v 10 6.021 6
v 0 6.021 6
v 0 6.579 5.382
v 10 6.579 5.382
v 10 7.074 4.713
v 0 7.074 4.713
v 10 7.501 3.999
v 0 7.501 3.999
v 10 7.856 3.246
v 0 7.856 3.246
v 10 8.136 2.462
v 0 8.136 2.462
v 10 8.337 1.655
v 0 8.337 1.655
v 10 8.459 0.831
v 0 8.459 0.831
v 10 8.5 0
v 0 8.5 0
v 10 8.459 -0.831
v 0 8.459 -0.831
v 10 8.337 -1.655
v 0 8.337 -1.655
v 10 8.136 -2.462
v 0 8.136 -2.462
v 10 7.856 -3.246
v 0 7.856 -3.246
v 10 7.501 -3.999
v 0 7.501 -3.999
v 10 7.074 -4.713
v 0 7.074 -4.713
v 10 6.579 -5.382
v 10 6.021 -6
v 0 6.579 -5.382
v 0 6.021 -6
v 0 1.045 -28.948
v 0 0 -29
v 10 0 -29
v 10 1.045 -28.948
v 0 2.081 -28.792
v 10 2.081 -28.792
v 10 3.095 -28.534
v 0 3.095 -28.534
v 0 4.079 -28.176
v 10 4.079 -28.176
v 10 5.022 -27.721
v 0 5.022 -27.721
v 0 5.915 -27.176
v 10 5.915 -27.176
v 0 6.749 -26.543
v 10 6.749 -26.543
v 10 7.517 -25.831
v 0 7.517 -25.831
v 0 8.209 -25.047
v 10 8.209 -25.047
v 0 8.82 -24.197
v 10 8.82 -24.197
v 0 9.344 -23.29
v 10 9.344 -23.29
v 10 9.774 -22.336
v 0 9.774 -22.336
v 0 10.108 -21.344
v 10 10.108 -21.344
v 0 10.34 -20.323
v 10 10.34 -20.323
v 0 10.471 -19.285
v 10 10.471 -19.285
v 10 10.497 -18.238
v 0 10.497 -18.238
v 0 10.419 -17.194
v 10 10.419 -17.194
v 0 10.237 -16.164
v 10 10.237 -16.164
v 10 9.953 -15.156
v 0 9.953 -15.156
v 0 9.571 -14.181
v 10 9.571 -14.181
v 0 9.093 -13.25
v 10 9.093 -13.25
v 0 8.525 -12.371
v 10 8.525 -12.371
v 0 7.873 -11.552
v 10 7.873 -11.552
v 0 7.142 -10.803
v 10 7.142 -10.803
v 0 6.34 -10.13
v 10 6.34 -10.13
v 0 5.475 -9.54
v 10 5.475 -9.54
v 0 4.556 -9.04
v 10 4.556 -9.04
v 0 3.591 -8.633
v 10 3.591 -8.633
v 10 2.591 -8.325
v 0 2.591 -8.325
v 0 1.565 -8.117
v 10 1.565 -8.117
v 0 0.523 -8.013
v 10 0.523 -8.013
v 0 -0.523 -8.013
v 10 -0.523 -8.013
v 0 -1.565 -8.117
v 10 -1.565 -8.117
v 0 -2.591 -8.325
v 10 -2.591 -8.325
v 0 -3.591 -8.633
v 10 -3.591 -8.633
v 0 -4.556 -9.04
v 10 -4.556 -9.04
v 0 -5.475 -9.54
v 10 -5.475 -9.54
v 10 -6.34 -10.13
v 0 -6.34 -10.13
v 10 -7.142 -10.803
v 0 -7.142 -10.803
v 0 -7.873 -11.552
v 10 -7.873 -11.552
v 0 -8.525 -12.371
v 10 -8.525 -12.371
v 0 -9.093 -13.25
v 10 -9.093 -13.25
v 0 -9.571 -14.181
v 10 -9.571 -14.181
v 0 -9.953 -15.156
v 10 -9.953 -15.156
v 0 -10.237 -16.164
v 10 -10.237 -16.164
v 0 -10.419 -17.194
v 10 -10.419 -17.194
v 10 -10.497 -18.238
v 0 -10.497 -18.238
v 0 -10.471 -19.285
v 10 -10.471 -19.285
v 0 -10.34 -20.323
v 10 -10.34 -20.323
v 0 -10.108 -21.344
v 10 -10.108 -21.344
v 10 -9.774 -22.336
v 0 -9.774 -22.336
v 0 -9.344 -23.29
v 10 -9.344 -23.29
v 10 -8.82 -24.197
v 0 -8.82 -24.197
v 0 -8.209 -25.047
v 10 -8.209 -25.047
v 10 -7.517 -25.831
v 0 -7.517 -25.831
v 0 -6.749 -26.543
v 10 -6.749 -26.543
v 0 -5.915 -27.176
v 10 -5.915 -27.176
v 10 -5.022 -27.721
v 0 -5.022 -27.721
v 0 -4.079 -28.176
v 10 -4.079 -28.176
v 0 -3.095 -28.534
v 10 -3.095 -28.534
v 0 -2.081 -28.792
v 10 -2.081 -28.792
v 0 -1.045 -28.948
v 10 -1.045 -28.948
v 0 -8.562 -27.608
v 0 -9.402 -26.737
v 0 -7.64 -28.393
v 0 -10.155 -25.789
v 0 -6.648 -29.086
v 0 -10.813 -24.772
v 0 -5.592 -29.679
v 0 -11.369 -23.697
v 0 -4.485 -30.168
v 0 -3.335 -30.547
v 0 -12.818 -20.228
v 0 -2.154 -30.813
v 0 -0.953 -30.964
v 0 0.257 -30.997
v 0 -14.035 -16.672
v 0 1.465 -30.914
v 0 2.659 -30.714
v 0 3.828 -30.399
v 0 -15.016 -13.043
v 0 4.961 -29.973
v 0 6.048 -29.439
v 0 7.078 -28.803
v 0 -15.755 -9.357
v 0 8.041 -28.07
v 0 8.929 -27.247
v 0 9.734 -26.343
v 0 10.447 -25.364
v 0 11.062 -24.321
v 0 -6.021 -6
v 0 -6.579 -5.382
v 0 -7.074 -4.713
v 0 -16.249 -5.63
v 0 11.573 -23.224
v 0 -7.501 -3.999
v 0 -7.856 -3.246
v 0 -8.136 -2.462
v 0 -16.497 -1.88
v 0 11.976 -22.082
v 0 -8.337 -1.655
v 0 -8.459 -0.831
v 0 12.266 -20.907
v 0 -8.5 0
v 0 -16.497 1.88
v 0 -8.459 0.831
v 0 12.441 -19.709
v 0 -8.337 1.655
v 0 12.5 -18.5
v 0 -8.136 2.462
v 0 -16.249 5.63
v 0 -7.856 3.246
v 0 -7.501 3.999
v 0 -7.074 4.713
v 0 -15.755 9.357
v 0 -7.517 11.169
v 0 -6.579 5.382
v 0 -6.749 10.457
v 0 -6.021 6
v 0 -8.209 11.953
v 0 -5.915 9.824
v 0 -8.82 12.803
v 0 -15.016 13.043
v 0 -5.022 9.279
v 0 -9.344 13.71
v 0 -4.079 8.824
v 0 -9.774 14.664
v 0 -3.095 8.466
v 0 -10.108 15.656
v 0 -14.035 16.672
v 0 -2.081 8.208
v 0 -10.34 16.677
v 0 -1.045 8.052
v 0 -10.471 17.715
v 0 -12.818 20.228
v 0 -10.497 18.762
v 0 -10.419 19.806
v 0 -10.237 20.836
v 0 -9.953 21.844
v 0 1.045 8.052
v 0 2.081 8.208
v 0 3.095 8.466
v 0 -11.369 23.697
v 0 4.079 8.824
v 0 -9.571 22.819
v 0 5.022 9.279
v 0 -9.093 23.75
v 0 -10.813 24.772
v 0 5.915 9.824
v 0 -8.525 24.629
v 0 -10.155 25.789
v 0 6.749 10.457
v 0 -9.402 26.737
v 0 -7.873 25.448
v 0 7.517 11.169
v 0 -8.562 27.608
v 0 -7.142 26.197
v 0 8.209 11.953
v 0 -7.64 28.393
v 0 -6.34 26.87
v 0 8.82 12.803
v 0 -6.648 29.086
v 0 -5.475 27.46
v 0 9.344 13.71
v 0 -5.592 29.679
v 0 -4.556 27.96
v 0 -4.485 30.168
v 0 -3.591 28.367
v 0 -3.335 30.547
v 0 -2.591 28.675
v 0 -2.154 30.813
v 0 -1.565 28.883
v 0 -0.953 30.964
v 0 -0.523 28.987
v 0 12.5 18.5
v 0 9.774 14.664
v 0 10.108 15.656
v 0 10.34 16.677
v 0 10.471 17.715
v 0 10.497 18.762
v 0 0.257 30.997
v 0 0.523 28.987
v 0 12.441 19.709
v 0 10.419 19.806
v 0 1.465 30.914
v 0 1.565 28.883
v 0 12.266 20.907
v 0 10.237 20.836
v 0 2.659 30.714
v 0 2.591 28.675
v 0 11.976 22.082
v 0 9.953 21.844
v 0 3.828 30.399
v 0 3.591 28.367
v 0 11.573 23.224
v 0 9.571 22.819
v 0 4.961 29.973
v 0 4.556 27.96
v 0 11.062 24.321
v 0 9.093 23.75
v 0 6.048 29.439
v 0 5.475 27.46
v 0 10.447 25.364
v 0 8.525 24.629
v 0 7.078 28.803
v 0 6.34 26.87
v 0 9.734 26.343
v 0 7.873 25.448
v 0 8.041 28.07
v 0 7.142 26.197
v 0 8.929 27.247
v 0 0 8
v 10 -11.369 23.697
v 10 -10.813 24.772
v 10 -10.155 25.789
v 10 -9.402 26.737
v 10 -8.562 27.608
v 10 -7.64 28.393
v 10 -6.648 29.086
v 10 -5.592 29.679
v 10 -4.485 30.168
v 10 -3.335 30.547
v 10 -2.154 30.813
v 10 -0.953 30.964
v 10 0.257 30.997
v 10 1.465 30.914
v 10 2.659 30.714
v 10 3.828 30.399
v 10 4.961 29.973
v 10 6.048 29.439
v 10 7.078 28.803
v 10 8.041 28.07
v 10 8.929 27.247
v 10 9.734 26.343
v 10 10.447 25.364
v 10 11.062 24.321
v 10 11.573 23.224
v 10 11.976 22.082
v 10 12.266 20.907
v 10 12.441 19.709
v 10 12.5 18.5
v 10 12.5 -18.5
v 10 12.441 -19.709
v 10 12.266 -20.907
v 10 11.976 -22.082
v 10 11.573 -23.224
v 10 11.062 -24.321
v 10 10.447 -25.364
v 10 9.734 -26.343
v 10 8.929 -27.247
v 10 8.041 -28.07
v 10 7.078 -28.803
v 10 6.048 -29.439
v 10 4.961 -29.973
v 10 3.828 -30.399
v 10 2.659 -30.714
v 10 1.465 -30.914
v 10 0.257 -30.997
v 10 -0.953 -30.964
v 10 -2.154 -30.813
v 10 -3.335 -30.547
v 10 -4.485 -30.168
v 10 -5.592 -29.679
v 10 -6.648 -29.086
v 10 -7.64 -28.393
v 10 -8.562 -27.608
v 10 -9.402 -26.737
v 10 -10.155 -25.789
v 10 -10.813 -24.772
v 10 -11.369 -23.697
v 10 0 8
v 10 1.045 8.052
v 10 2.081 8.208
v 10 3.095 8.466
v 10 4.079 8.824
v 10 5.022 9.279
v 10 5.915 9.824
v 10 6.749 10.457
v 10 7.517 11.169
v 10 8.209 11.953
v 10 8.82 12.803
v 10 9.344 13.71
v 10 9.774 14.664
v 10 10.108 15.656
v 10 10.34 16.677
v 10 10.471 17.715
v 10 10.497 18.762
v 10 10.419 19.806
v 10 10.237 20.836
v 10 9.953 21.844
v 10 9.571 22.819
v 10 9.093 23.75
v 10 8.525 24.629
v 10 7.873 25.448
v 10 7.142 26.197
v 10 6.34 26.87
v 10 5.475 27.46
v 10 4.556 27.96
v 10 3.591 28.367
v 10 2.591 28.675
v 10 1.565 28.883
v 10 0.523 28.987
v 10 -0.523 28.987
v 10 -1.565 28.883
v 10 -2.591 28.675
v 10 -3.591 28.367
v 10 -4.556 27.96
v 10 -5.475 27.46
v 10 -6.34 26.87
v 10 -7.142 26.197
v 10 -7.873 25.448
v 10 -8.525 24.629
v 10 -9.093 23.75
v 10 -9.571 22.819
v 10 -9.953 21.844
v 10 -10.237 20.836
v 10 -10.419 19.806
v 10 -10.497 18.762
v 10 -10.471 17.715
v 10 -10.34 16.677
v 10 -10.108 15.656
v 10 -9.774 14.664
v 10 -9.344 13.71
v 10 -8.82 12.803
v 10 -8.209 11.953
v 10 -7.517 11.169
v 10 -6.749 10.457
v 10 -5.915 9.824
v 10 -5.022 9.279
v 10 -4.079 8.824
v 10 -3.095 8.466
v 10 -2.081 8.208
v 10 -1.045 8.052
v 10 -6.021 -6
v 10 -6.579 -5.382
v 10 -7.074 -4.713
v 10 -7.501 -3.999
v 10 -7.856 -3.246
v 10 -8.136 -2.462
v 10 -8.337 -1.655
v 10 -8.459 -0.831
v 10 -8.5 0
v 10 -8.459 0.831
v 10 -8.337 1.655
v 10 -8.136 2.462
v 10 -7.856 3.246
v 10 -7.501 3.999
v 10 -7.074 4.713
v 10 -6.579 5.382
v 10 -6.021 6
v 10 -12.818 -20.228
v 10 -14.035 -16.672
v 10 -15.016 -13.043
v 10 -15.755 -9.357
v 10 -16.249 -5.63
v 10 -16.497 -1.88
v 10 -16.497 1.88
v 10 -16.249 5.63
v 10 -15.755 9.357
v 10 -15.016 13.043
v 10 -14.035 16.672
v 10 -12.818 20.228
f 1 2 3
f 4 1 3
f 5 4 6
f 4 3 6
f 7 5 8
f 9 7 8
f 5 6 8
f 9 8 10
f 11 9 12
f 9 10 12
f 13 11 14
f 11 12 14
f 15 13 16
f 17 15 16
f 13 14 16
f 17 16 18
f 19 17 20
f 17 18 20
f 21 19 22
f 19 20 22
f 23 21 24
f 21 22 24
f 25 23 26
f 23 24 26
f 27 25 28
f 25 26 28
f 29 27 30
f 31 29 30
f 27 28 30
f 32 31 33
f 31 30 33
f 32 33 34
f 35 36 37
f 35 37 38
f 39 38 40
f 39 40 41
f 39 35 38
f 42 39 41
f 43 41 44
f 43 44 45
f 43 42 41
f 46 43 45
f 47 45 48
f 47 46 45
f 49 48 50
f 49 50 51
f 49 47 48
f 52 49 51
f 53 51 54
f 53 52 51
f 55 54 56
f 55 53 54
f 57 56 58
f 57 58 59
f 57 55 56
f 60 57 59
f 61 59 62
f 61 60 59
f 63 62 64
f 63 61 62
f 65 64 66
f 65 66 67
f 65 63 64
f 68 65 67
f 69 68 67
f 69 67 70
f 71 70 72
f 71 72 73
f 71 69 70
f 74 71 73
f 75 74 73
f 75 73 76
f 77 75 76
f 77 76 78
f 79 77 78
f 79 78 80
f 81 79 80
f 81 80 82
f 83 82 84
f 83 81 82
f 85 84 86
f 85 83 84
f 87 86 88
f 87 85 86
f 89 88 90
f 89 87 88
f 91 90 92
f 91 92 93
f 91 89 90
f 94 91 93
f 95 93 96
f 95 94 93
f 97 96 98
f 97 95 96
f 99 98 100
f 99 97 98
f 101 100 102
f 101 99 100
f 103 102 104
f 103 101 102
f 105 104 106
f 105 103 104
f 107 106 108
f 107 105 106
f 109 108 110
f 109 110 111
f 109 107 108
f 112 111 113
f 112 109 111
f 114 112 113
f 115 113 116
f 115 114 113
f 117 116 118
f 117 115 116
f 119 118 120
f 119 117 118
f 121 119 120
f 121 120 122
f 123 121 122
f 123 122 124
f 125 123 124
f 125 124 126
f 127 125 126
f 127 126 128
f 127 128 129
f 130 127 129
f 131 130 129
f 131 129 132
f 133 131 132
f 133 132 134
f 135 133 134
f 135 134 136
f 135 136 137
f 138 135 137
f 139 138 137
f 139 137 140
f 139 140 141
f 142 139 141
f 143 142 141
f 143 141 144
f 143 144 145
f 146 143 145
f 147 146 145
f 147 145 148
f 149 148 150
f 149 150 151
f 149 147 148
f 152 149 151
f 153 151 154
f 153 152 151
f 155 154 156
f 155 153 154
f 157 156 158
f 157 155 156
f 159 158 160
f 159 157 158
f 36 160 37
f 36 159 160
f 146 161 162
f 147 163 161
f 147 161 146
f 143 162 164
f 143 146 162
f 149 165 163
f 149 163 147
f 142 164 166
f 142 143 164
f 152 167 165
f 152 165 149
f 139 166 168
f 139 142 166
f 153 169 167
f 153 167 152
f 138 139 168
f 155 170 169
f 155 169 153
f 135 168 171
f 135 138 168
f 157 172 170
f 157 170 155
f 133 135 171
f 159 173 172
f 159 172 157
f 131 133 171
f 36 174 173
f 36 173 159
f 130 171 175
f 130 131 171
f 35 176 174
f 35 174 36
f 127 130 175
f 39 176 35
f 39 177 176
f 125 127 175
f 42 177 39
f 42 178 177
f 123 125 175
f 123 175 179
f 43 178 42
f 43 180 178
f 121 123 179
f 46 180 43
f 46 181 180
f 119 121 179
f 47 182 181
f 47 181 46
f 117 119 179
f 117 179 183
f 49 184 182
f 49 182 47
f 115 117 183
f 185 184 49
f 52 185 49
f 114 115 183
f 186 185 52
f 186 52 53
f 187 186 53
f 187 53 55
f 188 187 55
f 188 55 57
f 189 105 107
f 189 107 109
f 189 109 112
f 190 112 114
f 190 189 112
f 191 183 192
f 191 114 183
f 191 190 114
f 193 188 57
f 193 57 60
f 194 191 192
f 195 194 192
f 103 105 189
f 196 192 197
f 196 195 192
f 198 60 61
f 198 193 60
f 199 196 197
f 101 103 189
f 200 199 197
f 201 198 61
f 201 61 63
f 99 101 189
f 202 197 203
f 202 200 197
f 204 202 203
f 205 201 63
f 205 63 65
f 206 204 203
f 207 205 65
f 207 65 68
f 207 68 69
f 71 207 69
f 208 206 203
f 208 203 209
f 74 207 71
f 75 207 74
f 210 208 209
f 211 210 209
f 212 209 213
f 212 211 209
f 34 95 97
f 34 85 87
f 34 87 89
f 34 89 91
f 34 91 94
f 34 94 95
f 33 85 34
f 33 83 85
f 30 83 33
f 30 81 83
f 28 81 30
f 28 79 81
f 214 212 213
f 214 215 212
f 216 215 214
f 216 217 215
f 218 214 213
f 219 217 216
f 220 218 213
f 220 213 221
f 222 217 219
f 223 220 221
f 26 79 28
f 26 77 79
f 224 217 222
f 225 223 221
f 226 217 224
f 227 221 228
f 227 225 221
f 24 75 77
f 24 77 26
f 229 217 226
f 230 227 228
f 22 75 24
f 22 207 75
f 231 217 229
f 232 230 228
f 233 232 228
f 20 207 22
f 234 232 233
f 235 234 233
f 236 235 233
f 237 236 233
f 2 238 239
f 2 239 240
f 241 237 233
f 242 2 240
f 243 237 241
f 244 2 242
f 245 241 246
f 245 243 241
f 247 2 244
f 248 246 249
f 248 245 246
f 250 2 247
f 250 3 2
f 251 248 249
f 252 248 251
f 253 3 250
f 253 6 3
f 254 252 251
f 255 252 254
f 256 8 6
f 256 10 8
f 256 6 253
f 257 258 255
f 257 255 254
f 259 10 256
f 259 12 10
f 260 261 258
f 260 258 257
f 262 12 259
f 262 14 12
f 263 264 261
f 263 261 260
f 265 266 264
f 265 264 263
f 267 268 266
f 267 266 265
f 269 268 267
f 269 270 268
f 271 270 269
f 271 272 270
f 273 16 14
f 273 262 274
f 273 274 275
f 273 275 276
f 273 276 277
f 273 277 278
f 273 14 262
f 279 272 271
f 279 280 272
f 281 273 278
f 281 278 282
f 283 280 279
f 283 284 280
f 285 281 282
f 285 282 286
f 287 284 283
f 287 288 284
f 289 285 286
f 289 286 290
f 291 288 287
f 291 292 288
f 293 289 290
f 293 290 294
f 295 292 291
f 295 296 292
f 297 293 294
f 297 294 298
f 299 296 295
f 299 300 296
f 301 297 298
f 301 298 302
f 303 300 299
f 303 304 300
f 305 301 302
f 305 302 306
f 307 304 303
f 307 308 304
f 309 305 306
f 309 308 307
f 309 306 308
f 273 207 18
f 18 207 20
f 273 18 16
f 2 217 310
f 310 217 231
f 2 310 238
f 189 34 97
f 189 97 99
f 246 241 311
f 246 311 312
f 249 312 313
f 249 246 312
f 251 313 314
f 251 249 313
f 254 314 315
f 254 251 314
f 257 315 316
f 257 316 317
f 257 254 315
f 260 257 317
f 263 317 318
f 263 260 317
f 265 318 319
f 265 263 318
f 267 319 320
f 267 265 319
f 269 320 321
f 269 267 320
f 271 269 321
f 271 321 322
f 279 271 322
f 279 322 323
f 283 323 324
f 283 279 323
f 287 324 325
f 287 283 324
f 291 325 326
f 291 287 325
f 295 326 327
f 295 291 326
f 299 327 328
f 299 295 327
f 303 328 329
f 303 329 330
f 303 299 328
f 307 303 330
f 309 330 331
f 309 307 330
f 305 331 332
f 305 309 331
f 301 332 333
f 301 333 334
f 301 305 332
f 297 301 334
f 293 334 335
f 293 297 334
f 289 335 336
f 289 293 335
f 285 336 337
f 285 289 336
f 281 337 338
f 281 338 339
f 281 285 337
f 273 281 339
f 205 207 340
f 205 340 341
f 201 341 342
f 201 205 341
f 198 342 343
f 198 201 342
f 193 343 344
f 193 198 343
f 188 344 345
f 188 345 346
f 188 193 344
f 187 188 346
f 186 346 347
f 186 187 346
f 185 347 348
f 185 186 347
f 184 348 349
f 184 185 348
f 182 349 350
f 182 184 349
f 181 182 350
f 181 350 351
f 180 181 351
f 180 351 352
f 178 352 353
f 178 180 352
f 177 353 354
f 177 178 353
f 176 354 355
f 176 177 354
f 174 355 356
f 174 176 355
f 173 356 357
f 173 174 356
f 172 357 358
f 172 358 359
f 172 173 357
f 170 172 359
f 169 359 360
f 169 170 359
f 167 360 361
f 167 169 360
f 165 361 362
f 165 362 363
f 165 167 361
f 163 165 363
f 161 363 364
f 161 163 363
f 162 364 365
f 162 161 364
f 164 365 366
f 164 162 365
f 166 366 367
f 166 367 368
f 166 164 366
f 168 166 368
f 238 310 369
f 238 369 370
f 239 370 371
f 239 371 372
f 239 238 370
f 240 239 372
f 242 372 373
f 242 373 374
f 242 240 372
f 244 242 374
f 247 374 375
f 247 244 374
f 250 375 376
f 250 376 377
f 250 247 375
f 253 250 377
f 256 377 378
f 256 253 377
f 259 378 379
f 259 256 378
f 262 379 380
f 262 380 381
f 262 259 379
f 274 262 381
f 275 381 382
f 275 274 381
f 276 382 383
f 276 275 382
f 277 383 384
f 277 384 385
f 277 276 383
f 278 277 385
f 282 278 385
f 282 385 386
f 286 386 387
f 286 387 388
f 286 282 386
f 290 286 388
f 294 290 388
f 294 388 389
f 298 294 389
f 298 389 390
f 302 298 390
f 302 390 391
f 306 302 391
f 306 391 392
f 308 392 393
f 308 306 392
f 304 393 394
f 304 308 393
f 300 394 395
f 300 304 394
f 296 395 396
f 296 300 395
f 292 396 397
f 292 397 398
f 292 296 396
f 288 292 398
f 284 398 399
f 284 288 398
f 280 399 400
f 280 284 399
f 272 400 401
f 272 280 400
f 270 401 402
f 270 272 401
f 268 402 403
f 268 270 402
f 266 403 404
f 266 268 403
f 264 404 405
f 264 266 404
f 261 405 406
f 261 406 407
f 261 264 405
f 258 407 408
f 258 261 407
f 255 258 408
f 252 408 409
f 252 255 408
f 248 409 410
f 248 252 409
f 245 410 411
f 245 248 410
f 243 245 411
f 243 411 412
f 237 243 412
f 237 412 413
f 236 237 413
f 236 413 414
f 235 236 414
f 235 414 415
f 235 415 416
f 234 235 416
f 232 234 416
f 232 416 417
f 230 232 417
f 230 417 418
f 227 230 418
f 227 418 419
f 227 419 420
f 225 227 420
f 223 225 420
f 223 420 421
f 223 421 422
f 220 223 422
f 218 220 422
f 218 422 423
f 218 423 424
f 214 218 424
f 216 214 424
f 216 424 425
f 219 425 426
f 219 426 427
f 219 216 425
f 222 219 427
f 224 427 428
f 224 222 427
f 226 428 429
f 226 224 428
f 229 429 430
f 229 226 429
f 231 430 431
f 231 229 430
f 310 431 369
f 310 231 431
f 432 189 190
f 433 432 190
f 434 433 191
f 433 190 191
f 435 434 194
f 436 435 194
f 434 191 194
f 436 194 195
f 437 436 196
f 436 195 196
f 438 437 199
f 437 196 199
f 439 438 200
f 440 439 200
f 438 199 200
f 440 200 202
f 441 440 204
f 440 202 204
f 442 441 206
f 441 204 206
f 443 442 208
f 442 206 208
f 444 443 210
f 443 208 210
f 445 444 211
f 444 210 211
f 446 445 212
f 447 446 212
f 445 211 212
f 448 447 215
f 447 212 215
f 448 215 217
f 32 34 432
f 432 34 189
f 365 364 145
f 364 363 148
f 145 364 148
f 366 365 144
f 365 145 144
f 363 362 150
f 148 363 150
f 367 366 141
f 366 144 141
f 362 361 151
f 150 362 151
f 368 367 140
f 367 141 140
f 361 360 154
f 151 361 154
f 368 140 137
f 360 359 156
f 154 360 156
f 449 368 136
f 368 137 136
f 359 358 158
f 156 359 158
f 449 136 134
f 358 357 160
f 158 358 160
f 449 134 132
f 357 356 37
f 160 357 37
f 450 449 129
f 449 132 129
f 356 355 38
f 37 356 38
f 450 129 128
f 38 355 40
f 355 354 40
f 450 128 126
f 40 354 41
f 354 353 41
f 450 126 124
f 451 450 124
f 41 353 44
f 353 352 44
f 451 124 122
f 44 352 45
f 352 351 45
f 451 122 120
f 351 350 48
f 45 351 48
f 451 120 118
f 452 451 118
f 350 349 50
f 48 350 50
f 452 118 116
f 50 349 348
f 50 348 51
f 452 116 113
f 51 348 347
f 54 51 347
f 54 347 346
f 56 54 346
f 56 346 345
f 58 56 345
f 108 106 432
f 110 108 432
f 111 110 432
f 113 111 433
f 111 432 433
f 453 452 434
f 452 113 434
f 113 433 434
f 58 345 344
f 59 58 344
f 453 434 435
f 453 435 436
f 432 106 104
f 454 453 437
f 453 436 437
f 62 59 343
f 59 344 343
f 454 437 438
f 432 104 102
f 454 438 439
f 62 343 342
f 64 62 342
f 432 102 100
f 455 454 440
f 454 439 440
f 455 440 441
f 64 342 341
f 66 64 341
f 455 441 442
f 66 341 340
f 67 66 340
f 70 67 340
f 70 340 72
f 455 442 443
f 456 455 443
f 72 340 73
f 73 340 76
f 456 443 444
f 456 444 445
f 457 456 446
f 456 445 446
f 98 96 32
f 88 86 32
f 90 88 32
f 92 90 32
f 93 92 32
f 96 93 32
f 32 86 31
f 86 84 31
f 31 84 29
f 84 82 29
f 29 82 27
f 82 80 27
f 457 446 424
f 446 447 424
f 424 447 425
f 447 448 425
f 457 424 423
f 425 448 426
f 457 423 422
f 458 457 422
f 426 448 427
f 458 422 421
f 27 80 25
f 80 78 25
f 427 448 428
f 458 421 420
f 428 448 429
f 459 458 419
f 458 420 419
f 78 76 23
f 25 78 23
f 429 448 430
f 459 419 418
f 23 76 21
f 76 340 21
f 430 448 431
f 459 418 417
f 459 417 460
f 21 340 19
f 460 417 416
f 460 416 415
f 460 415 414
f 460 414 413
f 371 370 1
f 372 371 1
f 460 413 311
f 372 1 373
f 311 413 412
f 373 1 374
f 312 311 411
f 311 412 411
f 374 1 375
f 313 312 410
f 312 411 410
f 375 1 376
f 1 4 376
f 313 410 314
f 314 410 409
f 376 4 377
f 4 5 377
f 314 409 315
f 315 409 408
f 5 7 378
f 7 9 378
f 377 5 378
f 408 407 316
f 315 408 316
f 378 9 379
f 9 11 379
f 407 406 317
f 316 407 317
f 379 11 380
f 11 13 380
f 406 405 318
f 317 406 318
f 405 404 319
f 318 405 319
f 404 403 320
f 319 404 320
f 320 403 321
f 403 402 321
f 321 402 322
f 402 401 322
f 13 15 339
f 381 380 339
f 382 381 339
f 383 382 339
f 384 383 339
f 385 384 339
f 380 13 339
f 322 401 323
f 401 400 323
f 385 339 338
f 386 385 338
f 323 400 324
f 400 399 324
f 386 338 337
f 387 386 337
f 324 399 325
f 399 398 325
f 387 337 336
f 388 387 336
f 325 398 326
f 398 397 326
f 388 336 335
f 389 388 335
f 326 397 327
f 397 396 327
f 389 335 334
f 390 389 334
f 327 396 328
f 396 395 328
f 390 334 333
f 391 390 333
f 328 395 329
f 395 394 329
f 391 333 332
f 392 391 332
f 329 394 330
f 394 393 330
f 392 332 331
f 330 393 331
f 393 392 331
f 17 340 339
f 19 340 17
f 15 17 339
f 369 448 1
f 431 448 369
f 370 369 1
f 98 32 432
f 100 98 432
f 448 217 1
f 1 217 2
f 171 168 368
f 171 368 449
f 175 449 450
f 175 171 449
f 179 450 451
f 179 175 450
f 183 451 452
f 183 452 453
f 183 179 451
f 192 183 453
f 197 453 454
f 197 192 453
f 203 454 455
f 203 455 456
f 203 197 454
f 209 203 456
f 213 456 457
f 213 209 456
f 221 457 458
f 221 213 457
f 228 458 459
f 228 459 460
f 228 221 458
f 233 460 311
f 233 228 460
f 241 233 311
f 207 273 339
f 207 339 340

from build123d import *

# Parameters (mm, degrees)
CROQUIS1_R              = 10.5
SALIENTE_EXTRUIR1_DEPTH = 10


with BuildPart() as part:
    # Croquis1 → Saliente-Extruir1 (new body)
    with BuildSketch(Plane(origin=(0, 0, 0), x_dir=(0, 0, -1), z_dir=(1, 0, 0))):
        with BuildLine():
            Line((-18.5, 12.5), (18.5, 12.5))
            ThreePointArc((18.5, 12.5), (30.713875068, 2.659183298), (23.696629213, -11.36859907))
            ThreePointArc((23.696629213, -11.36859907), (0, -16.52778731), (-23.696629213, -11.36859907))
            ThreePointArc((-23.696629213, -11.36859907), (-30.713875068, 2.659183298), (-18.5, 12.5))
        make_face()
        with Locations((18.5, 0)):
            Circle(CROQUIS1_R, mode=Mode.SUBTRACT)
        with Locations((-18.5, 0)):
            Circle(CROQUIS1_R, mode=Mode.SUBTRACT)
        with BuildLine():
            Line((-6, -6.020797289), (-6, 6.020797289))
            ThreePointArc((-6, 6.020797289), (0, 8.5), (6, 6.020797289))
            Line((6, 6.020797289), (6, -6.020797289))
            ThreePointArc((6, -6.020797289), (0, -8.5), (-6, -6.020797289))
        make_face(mode=Mode.SUBTRACT)
    extrude(amount=SALIENTE_EXTRUIR1_DEPTH)


solid = part.part
